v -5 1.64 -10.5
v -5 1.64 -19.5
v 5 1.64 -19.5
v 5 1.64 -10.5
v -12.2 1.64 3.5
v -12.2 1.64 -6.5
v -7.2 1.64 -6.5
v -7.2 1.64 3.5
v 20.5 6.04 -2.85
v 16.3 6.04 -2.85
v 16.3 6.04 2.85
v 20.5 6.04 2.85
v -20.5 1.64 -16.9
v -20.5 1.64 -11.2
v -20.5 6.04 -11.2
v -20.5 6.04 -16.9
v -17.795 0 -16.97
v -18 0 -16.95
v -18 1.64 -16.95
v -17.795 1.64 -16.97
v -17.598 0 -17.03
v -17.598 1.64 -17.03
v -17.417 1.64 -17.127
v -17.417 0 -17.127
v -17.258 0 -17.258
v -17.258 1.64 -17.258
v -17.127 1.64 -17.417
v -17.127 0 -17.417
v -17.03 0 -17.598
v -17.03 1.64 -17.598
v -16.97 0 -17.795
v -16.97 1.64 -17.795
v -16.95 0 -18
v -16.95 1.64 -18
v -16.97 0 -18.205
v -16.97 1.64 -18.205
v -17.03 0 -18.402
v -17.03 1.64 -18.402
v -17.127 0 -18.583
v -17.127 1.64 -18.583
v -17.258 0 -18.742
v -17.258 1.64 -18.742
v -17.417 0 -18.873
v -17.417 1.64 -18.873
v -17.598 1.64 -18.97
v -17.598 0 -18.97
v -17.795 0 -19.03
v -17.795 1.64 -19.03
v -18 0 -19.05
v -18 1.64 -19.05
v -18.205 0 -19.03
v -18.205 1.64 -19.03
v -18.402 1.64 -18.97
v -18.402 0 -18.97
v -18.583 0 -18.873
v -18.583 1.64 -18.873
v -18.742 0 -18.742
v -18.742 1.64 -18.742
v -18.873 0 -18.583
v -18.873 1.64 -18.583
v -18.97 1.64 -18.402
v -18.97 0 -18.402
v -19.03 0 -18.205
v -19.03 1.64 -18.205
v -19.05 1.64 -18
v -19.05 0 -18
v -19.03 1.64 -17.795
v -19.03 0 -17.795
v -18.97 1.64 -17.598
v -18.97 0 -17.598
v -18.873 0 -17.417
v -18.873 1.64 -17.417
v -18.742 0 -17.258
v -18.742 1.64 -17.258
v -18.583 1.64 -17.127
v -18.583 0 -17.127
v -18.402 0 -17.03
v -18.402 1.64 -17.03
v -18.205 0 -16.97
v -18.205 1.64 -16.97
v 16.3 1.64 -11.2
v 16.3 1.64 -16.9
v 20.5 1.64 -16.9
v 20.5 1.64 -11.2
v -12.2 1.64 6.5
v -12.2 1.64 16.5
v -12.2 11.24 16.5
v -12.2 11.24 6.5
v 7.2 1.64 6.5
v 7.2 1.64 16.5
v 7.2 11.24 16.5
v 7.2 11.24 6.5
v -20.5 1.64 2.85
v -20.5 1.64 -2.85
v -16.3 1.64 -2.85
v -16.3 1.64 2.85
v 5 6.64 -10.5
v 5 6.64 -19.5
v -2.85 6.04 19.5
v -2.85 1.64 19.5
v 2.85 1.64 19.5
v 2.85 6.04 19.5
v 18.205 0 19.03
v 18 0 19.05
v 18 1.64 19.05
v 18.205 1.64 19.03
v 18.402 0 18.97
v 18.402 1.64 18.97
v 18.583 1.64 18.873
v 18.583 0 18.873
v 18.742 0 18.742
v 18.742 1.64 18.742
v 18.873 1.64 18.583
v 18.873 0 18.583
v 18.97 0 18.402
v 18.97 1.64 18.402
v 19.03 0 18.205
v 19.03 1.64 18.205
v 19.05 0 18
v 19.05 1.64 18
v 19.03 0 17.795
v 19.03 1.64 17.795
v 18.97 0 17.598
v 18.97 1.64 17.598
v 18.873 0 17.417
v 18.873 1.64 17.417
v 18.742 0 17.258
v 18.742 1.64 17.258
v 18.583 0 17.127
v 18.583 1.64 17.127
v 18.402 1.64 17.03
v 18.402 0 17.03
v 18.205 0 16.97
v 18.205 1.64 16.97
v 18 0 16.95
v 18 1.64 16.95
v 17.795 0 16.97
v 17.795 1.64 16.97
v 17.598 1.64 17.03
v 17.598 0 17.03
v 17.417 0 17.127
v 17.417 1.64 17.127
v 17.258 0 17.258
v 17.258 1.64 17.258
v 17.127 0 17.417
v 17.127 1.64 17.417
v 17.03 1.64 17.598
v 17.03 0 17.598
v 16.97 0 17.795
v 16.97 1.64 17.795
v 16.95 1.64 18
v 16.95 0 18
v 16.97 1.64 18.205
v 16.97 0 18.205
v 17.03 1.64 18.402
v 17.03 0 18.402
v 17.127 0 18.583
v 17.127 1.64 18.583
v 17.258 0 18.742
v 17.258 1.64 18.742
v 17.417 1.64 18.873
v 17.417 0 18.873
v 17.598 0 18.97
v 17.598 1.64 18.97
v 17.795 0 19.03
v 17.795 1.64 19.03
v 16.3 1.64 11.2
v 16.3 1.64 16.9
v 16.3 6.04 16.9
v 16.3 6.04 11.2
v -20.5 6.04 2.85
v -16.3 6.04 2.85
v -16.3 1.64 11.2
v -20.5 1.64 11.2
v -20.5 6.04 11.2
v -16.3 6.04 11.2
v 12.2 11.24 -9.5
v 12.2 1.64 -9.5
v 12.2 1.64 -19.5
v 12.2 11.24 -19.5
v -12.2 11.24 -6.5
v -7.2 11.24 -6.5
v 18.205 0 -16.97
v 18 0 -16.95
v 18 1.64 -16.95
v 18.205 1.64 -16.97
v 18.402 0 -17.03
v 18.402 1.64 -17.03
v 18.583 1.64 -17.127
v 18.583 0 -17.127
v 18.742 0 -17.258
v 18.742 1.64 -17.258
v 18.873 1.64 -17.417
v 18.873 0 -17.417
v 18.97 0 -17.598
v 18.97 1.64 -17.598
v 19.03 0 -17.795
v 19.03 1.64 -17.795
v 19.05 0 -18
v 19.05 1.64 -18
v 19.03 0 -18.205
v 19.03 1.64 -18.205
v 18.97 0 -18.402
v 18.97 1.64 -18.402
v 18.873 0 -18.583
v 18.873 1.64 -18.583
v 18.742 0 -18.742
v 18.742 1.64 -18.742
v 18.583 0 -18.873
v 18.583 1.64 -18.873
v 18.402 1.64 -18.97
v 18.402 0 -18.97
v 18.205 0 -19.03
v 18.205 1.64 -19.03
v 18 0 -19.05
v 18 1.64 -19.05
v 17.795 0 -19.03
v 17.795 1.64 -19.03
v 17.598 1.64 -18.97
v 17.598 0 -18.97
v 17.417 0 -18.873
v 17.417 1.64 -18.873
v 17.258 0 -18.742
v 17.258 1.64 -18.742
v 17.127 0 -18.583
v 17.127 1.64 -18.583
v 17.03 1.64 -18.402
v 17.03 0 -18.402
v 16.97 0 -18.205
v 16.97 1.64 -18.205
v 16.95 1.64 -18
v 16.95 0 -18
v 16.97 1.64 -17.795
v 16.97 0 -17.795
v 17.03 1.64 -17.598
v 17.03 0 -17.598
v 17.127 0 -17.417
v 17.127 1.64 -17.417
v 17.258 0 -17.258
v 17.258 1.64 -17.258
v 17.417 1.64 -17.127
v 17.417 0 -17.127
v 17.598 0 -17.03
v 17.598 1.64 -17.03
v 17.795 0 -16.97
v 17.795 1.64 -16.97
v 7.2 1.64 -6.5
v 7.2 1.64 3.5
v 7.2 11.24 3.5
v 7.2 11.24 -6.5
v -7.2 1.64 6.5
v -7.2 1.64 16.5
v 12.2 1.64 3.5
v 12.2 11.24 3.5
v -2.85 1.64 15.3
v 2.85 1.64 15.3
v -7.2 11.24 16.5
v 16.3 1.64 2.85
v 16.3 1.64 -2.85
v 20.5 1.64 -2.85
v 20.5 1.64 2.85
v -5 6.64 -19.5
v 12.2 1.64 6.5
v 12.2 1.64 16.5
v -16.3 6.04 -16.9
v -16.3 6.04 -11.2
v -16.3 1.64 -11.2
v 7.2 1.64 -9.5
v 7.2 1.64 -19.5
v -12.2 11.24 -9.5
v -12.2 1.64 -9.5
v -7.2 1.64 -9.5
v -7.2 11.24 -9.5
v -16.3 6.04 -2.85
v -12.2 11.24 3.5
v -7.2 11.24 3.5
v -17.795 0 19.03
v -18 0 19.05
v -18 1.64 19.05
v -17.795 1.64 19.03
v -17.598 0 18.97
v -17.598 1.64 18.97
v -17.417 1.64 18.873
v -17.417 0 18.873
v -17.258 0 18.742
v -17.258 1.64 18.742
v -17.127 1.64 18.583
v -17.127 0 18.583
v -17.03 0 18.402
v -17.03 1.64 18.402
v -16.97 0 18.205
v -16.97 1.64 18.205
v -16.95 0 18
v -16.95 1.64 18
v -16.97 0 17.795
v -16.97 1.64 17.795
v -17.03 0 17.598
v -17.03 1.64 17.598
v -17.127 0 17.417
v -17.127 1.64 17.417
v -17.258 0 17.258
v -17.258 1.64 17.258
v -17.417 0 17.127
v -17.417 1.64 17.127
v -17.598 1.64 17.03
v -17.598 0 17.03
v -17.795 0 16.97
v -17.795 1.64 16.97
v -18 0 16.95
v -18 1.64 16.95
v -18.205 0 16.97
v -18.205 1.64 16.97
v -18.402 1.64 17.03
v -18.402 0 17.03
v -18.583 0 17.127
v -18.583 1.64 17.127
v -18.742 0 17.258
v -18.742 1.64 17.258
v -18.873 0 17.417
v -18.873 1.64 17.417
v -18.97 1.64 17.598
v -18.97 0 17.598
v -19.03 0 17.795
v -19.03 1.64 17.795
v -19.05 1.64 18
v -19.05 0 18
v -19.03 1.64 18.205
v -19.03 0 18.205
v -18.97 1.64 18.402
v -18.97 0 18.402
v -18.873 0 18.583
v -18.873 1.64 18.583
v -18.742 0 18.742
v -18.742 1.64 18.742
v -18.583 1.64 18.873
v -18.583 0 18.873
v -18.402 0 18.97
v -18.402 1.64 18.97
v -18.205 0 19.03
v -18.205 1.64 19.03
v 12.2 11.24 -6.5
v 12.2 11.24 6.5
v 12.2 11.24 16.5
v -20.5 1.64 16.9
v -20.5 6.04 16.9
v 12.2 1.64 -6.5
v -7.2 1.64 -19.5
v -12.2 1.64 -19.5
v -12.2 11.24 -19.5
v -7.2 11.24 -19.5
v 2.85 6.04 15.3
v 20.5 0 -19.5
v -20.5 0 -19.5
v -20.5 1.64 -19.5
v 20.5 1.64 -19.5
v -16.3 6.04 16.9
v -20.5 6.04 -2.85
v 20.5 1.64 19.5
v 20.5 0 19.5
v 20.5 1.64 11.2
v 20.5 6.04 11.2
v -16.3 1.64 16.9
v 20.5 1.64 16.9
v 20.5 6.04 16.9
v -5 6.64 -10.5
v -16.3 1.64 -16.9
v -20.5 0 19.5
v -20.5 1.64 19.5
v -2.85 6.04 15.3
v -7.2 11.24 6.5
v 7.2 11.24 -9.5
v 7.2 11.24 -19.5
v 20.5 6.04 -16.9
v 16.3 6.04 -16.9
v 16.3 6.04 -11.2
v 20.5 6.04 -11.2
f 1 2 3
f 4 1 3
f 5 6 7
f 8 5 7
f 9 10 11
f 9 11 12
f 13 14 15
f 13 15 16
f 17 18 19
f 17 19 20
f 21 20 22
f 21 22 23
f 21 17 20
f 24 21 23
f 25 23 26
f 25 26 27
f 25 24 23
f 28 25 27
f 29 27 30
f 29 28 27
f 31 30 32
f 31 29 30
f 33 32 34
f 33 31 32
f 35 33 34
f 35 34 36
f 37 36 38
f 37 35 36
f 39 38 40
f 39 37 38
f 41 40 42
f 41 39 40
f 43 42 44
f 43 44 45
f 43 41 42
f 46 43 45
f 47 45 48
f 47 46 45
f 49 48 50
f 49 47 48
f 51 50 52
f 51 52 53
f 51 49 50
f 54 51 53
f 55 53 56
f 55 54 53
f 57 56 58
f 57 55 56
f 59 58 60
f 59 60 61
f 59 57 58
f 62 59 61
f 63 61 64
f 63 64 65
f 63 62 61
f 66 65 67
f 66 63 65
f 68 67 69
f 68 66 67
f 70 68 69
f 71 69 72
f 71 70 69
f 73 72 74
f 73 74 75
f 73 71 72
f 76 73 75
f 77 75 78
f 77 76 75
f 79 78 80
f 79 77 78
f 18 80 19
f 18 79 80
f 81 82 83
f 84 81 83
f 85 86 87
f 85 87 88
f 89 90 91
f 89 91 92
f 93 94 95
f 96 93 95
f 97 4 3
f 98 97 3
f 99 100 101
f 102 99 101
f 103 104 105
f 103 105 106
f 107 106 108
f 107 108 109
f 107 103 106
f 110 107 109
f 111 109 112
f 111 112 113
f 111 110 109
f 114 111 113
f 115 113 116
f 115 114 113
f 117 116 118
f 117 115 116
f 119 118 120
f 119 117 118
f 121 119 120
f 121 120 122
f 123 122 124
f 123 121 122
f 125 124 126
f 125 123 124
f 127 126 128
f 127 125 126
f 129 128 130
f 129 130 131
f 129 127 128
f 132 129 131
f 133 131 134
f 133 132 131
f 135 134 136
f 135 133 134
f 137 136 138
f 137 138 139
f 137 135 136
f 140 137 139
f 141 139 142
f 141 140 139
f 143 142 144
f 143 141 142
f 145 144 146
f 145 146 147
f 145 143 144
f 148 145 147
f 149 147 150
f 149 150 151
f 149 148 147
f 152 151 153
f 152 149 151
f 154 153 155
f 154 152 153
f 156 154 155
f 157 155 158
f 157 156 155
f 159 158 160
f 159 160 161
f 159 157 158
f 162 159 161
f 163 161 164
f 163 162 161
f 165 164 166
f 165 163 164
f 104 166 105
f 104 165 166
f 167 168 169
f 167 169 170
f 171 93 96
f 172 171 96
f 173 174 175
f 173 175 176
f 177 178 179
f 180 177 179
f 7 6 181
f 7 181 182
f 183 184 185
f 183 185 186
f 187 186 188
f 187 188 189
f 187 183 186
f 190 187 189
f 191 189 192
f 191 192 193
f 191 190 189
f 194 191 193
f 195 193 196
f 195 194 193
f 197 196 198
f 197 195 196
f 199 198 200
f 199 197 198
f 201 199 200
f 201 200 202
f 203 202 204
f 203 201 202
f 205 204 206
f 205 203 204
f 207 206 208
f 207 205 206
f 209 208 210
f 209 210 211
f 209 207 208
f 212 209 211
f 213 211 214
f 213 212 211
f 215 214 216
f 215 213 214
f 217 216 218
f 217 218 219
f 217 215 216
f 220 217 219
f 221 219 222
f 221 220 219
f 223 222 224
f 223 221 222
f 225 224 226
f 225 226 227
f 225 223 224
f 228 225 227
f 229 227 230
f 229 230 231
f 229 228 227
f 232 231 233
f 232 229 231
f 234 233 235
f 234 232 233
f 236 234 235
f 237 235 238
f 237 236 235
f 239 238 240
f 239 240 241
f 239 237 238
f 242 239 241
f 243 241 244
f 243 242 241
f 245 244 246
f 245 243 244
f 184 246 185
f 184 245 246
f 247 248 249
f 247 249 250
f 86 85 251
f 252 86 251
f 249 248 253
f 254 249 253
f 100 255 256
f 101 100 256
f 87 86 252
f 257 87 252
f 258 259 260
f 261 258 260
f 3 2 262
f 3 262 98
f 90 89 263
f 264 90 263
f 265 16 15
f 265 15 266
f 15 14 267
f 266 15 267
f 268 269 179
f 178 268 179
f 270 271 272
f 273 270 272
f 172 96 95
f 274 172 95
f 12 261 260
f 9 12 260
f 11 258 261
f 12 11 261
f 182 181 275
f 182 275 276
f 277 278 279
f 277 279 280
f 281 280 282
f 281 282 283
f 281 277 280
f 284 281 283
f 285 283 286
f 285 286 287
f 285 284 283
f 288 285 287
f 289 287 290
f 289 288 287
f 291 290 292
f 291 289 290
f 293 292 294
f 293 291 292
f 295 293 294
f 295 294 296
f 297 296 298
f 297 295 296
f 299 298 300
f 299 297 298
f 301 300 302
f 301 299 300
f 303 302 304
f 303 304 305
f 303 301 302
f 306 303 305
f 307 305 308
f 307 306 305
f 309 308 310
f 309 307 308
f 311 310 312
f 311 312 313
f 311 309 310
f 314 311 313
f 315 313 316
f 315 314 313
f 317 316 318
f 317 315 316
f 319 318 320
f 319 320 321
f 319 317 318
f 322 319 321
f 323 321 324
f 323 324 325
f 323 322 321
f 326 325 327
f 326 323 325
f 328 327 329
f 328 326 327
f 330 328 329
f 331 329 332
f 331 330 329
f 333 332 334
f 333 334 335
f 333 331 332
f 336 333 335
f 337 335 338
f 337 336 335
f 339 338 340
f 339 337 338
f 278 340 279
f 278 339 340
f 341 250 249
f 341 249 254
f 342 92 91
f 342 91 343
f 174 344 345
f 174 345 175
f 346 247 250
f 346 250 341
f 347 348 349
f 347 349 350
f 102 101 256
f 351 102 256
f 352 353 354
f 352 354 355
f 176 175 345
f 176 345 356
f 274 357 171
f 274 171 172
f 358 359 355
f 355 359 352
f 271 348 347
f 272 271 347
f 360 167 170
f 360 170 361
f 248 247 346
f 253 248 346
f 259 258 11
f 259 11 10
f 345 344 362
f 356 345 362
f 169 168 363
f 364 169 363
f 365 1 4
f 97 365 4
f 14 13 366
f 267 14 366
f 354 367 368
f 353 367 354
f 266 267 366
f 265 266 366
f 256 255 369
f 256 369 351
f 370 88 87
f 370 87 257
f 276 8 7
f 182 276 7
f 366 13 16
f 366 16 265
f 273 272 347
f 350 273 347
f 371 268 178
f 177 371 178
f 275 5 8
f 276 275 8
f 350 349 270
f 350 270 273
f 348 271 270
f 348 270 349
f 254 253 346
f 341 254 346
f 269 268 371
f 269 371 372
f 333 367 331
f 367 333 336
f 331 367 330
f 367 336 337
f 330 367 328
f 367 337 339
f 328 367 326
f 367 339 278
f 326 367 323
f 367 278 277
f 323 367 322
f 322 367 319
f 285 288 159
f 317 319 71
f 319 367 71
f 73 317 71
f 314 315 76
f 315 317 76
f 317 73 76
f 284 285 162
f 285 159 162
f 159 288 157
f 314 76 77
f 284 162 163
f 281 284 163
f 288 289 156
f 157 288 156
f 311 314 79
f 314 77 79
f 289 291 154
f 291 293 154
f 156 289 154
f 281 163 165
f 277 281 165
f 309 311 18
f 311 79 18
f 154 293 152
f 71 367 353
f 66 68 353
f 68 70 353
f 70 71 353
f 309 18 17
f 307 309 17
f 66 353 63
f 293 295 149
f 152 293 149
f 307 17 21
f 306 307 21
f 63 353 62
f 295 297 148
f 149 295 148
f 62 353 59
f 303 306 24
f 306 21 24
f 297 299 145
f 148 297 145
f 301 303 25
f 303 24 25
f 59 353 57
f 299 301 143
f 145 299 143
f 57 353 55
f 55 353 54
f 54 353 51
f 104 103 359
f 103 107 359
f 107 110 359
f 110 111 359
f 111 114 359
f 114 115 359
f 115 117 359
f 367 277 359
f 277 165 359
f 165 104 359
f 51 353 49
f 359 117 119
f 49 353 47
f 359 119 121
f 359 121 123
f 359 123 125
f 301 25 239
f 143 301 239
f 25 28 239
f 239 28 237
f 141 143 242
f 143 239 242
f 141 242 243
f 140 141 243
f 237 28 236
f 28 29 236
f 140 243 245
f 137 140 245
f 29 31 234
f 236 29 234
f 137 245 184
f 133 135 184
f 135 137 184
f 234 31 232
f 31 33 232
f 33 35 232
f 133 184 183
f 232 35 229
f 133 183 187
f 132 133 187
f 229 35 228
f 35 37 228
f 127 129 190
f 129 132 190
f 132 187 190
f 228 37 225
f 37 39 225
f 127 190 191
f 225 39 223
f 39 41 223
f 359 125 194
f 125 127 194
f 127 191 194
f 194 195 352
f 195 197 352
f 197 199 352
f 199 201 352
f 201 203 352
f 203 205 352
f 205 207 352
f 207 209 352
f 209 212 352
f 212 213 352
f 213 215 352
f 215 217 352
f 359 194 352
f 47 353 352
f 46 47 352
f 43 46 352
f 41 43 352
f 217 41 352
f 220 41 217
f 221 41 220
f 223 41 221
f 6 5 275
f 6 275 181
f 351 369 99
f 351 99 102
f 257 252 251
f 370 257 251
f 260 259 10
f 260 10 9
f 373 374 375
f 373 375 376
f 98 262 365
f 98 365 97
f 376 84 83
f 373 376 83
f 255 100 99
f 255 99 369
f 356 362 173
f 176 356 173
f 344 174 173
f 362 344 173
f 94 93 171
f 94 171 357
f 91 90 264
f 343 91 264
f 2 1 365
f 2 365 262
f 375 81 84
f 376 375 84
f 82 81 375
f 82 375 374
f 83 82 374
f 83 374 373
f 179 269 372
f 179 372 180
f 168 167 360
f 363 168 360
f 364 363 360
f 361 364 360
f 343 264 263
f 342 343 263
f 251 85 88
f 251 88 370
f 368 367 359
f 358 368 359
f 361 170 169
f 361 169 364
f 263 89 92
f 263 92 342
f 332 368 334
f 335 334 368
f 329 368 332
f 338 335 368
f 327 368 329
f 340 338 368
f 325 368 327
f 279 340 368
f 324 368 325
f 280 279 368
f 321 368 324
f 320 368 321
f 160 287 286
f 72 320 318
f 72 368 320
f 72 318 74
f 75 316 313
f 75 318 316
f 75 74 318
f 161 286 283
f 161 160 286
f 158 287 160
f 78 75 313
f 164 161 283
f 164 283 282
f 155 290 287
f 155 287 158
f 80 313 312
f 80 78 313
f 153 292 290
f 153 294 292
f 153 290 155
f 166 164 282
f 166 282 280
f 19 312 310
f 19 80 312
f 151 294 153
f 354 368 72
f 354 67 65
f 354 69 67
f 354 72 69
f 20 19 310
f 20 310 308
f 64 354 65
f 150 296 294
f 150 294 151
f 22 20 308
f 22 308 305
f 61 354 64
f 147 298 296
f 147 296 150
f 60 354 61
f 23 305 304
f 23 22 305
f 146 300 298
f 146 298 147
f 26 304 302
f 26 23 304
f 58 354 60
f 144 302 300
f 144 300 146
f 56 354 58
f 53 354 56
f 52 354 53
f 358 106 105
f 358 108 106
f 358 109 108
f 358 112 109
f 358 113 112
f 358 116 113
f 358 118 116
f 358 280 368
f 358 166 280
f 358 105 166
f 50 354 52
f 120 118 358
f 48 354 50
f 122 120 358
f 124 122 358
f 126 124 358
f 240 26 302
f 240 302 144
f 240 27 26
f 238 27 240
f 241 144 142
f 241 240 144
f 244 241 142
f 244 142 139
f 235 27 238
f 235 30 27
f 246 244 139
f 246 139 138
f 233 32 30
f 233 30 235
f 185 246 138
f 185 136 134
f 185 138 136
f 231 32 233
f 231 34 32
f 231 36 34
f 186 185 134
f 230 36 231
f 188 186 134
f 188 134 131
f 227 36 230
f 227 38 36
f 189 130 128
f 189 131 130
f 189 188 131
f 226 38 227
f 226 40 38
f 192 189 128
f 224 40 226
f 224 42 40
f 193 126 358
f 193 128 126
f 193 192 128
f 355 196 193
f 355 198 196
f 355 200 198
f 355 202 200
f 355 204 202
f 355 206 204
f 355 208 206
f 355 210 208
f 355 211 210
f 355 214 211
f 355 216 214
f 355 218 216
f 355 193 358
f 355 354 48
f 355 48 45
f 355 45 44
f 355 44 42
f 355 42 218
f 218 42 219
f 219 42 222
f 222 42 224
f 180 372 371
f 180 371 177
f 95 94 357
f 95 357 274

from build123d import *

# Parameters (mm, degrees)
SKETCH_1_W        = 41
SKETCH_1_H        = 39
SKETCH_1_R        = 1.05
EXTRUDE_437_DEPTH = 1.64
SKETCH_3_W        = 10
SKETCH_3_H        = 9
XT30_DEPTH        = 5
SKETCH_4_W        = 4.2
SKETCH_4_H        = 5.7
CAN_DEPTH         = 4.4
CAN_2_DEPTH       = 4.4
CAN_3_DEPTH       = 4.4
CAN_4_DEPTH       = 4.4
CAN_5_DEPTH       = 4.4
CAN_6_DEPTH       = 4.4
SKETCH_4_W_2      = 5.7
SKETCH_4_H_2      = 4.2
CAN_7_DEPTH       = 4.4
SKETCH_5_W        = 5
SKETCH_5_H        = 10
XT30_2_DEPTH      = 9.6
XT30_2_2_DEPTH    = 9.6
XT30_2_3_DEPTH    = 9.6
XT30_2_4_DEPTH    = 9.6
XT30_2_5_DEPTH    = 9.6
XT30_2_6_DEPTH    = 9.6


with BuildPart() as part:
    # 草图1 → Extrude 437 (new body)
    with BuildSketch(Plane(origin=(0, 0, 0), x_dir=(1, 0, 0), z_dir=(0, 1, 0))):
        Rectangle(SKETCH_1_W, SKETCH_1_H)
        with Locations(Location((18, 18, 0), (0, 0, 270))):
            Circle(SKETCH_1_R, mode=Mode.SUBTRACT)
        with Locations(Location((-18, 18, 0), (0, 0, 270))):
            Circle(SKETCH_1_R, mode=Mode.SUBTRACT)
        with Locations(Location((-18, -18, 0), (0, 0, 270))):
            Circle(SKETCH_1_R, mode=Mode.SUBTRACT)
        with Locations(Location((18, -18, 0), (0, 0, 270))):
            Circle(SKETCH_1_R, mode=Mode.SUBTRACT)
    extrude(amount=EXTRUDE_437_DEPTH)


with BuildPart() as body_2:
    # 草图3 → xt30 (new body)
    with BuildSketch(Plane(origin=(0, 1.64, 0), x_dir=(1, 0, 0), z_dir=(0, 1, 0))):
        with Locations((0, 15)):
            Rectangle(SKETCH_3_W, SKETCH_3_H)
    extrude(amount=XT30_DEPTH)


with BuildPart() as body_3:
    # 草图4 → can (new body)
    with BuildSketch(Plane(origin=(0, 1.64, 0), x_dir=(1, 0, 0), z_dir=(0, 1, 0))):
        with Locations((18.4, 14.05)):
            Rectangle(SKETCH_4_W, SKETCH_4_H)
    extrude(amount=CAN_DEPTH)


with BuildPart() as body_4:
    # 草图4 → can 2 (new body)
    with BuildSketch(Plane(origin=(0, 1.64, 0), x_dir=(1, 0, 0), z_dir=(0, 1, 0))):
        with Locations((18.4, 0)):
            Rectangle(SKETCH_4_W, SKETCH_4_H)
    extrude(amount=CAN_2_DEPTH)


with BuildPart() as body_5:
    # 草图4 → can 3 (new body)
    with BuildSketch(Plane(origin=(0, 1.64, 0), x_dir=(1, 0, 0), z_dir=(0, 1, 0))):
        with Locations((18.4, -14.05)):
            Rectangle(SKETCH_4_W, SKETCH_4_H)
    extrude(amount=CAN_3_DEPTH)


with BuildPart() as body_6:
    # 草图4 → can 4 (new body)
    with BuildSketch(Plane(origin=(0, 1.64, 0), x_dir=(1, 0, 0), z_dir=(0, 1, 0))):
        with Locations((-18.4, -14.05)):
            Rectangle(SKETCH_4_W, SKETCH_4_H)
    extrude(amount=CAN_4_DEPTH)


with BuildPart() as body_7:
    # 草图4 → can 5 (new body)
    with BuildSketch(Plane(origin=(0, 1.64, 0), x_dir=(1, 0, 0), z_dir=(0, 1, 0))):
        with Locations((-18.4, 0)):
            Rectangle(SKETCH_4_W, SKETCH_4_H)
    extrude(amount=CAN_5_DEPTH)


with BuildPart() as body_8:
    # 草图4 → can 6 (new body)
    with BuildSketch(Plane(origin=(0, 1.64, 0), x_dir=(1, 0, 0), z_dir=(0, 1, 0))):
        with Locations((-18.4, 14.05)):
            Rectangle(SKETCH_4_W, SKETCH_4_H)
    extrude(amount=CAN_6_DEPTH)


with BuildPart() as body_9:
    # 草图4 → can 7 (new body)
    with BuildSketch(Plane(origin=(0, 1.64, 0), x_dir=(1, 0, 0), z_dir=(0, 1, 0))):
        with Locations((0, -17.4)):
            Rectangle(SKETCH_4_W_2, SKETCH_4_H_2)
    extrude(amount=CAN_7_DEPTH)


with BuildPart() as body_10:
    # 草图5 → xt30 2 (new body)
    with BuildSketch(Plane(origin=(0, 1.64, 0), x_dir=(1, 0, 0), z_dir=(0, 1, 0))):
        with Locations((-9.7, 14.5)):
            Rectangle(SKETCH_5_W, SKETCH_5_H)
    extrude(amount=XT30_2_DEPTH)


with BuildPart() as body_11:
    # 草图5 → xt30 2 2 (new body)
    with BuildSketch(Plane(origin=(0, 1.64, 0), x_dir=(1, 0, 0), z_dir=(0, 1, 0))):
        with Locations((-9.7, 1.5)):
            Rectangle(SKETCH_5_W, SKETCH_5_H)
    extrude(amount=XT30_2_2_DEPTH)


with BuildPart() as body_12:
    # 草图5 → xt30 2 3 (new body)
    with BuildSketch(Plane(origin=(0, 1.64, 0), x_dir=(1, 0, 0), z_dir=(0, 1, 0))):
        with Locations((-9.7, -11.5)):
            Rectangle(SKETCH_5_W, SKETCH_5_H)
    extrude(amount=XT30_2_3_DEPTH)


with BuildPart() as body_13:
    # 草图5 → xt30 2 4 (new body)
    with BuildSketch(Plane(origin=(0, 1.64, 0), x_dir=(1, 0, 0), z_dir=(0, 1, 0))):
        with Locations((9.7, -11.5)):
            Rectangle(SKETCH_5_W, SKETCH_5_H)
    extrude(amount=XT30_2_4_DEPTH)


with BuildPart() as body_14:
    # 草图5 → xt30 2 5 (new body)
    with BuildSketch(Plane(origin=(0, 1.64, 0), x_dir=(1, 0, 0), z_dir=(0, 1, 0))):
        with Locations((9.7, 1.5)):
            Rectangle(SKETCH_5_W, SKETCH_5_H)
    extrude(amount=XT30_2_5_DEPTH)


with BuildPart() as body_15:
    # 草图5 → xt30 2 6 (new body)
    with BuildSketch(Plane(origin=(0, 1.64, 0), x_dir=(1, 0, 0), z_dir=(0, 1, 0))):
        with Locations((9.7, 14.5)):
            Rectangle(SKETCH_5_W, SKETCH_5_H)
    extrude(amount=XT30_2_6_DEPTH)


solid = Compound([part.part, body_2.part, body_3.part, body_4.part, body_5.part, body_6.part, body_7.part, body_8.part, body_9.part, body_10.part, body_11.part, body_12.part, body_13.part, body_14.part, body_15.part])
